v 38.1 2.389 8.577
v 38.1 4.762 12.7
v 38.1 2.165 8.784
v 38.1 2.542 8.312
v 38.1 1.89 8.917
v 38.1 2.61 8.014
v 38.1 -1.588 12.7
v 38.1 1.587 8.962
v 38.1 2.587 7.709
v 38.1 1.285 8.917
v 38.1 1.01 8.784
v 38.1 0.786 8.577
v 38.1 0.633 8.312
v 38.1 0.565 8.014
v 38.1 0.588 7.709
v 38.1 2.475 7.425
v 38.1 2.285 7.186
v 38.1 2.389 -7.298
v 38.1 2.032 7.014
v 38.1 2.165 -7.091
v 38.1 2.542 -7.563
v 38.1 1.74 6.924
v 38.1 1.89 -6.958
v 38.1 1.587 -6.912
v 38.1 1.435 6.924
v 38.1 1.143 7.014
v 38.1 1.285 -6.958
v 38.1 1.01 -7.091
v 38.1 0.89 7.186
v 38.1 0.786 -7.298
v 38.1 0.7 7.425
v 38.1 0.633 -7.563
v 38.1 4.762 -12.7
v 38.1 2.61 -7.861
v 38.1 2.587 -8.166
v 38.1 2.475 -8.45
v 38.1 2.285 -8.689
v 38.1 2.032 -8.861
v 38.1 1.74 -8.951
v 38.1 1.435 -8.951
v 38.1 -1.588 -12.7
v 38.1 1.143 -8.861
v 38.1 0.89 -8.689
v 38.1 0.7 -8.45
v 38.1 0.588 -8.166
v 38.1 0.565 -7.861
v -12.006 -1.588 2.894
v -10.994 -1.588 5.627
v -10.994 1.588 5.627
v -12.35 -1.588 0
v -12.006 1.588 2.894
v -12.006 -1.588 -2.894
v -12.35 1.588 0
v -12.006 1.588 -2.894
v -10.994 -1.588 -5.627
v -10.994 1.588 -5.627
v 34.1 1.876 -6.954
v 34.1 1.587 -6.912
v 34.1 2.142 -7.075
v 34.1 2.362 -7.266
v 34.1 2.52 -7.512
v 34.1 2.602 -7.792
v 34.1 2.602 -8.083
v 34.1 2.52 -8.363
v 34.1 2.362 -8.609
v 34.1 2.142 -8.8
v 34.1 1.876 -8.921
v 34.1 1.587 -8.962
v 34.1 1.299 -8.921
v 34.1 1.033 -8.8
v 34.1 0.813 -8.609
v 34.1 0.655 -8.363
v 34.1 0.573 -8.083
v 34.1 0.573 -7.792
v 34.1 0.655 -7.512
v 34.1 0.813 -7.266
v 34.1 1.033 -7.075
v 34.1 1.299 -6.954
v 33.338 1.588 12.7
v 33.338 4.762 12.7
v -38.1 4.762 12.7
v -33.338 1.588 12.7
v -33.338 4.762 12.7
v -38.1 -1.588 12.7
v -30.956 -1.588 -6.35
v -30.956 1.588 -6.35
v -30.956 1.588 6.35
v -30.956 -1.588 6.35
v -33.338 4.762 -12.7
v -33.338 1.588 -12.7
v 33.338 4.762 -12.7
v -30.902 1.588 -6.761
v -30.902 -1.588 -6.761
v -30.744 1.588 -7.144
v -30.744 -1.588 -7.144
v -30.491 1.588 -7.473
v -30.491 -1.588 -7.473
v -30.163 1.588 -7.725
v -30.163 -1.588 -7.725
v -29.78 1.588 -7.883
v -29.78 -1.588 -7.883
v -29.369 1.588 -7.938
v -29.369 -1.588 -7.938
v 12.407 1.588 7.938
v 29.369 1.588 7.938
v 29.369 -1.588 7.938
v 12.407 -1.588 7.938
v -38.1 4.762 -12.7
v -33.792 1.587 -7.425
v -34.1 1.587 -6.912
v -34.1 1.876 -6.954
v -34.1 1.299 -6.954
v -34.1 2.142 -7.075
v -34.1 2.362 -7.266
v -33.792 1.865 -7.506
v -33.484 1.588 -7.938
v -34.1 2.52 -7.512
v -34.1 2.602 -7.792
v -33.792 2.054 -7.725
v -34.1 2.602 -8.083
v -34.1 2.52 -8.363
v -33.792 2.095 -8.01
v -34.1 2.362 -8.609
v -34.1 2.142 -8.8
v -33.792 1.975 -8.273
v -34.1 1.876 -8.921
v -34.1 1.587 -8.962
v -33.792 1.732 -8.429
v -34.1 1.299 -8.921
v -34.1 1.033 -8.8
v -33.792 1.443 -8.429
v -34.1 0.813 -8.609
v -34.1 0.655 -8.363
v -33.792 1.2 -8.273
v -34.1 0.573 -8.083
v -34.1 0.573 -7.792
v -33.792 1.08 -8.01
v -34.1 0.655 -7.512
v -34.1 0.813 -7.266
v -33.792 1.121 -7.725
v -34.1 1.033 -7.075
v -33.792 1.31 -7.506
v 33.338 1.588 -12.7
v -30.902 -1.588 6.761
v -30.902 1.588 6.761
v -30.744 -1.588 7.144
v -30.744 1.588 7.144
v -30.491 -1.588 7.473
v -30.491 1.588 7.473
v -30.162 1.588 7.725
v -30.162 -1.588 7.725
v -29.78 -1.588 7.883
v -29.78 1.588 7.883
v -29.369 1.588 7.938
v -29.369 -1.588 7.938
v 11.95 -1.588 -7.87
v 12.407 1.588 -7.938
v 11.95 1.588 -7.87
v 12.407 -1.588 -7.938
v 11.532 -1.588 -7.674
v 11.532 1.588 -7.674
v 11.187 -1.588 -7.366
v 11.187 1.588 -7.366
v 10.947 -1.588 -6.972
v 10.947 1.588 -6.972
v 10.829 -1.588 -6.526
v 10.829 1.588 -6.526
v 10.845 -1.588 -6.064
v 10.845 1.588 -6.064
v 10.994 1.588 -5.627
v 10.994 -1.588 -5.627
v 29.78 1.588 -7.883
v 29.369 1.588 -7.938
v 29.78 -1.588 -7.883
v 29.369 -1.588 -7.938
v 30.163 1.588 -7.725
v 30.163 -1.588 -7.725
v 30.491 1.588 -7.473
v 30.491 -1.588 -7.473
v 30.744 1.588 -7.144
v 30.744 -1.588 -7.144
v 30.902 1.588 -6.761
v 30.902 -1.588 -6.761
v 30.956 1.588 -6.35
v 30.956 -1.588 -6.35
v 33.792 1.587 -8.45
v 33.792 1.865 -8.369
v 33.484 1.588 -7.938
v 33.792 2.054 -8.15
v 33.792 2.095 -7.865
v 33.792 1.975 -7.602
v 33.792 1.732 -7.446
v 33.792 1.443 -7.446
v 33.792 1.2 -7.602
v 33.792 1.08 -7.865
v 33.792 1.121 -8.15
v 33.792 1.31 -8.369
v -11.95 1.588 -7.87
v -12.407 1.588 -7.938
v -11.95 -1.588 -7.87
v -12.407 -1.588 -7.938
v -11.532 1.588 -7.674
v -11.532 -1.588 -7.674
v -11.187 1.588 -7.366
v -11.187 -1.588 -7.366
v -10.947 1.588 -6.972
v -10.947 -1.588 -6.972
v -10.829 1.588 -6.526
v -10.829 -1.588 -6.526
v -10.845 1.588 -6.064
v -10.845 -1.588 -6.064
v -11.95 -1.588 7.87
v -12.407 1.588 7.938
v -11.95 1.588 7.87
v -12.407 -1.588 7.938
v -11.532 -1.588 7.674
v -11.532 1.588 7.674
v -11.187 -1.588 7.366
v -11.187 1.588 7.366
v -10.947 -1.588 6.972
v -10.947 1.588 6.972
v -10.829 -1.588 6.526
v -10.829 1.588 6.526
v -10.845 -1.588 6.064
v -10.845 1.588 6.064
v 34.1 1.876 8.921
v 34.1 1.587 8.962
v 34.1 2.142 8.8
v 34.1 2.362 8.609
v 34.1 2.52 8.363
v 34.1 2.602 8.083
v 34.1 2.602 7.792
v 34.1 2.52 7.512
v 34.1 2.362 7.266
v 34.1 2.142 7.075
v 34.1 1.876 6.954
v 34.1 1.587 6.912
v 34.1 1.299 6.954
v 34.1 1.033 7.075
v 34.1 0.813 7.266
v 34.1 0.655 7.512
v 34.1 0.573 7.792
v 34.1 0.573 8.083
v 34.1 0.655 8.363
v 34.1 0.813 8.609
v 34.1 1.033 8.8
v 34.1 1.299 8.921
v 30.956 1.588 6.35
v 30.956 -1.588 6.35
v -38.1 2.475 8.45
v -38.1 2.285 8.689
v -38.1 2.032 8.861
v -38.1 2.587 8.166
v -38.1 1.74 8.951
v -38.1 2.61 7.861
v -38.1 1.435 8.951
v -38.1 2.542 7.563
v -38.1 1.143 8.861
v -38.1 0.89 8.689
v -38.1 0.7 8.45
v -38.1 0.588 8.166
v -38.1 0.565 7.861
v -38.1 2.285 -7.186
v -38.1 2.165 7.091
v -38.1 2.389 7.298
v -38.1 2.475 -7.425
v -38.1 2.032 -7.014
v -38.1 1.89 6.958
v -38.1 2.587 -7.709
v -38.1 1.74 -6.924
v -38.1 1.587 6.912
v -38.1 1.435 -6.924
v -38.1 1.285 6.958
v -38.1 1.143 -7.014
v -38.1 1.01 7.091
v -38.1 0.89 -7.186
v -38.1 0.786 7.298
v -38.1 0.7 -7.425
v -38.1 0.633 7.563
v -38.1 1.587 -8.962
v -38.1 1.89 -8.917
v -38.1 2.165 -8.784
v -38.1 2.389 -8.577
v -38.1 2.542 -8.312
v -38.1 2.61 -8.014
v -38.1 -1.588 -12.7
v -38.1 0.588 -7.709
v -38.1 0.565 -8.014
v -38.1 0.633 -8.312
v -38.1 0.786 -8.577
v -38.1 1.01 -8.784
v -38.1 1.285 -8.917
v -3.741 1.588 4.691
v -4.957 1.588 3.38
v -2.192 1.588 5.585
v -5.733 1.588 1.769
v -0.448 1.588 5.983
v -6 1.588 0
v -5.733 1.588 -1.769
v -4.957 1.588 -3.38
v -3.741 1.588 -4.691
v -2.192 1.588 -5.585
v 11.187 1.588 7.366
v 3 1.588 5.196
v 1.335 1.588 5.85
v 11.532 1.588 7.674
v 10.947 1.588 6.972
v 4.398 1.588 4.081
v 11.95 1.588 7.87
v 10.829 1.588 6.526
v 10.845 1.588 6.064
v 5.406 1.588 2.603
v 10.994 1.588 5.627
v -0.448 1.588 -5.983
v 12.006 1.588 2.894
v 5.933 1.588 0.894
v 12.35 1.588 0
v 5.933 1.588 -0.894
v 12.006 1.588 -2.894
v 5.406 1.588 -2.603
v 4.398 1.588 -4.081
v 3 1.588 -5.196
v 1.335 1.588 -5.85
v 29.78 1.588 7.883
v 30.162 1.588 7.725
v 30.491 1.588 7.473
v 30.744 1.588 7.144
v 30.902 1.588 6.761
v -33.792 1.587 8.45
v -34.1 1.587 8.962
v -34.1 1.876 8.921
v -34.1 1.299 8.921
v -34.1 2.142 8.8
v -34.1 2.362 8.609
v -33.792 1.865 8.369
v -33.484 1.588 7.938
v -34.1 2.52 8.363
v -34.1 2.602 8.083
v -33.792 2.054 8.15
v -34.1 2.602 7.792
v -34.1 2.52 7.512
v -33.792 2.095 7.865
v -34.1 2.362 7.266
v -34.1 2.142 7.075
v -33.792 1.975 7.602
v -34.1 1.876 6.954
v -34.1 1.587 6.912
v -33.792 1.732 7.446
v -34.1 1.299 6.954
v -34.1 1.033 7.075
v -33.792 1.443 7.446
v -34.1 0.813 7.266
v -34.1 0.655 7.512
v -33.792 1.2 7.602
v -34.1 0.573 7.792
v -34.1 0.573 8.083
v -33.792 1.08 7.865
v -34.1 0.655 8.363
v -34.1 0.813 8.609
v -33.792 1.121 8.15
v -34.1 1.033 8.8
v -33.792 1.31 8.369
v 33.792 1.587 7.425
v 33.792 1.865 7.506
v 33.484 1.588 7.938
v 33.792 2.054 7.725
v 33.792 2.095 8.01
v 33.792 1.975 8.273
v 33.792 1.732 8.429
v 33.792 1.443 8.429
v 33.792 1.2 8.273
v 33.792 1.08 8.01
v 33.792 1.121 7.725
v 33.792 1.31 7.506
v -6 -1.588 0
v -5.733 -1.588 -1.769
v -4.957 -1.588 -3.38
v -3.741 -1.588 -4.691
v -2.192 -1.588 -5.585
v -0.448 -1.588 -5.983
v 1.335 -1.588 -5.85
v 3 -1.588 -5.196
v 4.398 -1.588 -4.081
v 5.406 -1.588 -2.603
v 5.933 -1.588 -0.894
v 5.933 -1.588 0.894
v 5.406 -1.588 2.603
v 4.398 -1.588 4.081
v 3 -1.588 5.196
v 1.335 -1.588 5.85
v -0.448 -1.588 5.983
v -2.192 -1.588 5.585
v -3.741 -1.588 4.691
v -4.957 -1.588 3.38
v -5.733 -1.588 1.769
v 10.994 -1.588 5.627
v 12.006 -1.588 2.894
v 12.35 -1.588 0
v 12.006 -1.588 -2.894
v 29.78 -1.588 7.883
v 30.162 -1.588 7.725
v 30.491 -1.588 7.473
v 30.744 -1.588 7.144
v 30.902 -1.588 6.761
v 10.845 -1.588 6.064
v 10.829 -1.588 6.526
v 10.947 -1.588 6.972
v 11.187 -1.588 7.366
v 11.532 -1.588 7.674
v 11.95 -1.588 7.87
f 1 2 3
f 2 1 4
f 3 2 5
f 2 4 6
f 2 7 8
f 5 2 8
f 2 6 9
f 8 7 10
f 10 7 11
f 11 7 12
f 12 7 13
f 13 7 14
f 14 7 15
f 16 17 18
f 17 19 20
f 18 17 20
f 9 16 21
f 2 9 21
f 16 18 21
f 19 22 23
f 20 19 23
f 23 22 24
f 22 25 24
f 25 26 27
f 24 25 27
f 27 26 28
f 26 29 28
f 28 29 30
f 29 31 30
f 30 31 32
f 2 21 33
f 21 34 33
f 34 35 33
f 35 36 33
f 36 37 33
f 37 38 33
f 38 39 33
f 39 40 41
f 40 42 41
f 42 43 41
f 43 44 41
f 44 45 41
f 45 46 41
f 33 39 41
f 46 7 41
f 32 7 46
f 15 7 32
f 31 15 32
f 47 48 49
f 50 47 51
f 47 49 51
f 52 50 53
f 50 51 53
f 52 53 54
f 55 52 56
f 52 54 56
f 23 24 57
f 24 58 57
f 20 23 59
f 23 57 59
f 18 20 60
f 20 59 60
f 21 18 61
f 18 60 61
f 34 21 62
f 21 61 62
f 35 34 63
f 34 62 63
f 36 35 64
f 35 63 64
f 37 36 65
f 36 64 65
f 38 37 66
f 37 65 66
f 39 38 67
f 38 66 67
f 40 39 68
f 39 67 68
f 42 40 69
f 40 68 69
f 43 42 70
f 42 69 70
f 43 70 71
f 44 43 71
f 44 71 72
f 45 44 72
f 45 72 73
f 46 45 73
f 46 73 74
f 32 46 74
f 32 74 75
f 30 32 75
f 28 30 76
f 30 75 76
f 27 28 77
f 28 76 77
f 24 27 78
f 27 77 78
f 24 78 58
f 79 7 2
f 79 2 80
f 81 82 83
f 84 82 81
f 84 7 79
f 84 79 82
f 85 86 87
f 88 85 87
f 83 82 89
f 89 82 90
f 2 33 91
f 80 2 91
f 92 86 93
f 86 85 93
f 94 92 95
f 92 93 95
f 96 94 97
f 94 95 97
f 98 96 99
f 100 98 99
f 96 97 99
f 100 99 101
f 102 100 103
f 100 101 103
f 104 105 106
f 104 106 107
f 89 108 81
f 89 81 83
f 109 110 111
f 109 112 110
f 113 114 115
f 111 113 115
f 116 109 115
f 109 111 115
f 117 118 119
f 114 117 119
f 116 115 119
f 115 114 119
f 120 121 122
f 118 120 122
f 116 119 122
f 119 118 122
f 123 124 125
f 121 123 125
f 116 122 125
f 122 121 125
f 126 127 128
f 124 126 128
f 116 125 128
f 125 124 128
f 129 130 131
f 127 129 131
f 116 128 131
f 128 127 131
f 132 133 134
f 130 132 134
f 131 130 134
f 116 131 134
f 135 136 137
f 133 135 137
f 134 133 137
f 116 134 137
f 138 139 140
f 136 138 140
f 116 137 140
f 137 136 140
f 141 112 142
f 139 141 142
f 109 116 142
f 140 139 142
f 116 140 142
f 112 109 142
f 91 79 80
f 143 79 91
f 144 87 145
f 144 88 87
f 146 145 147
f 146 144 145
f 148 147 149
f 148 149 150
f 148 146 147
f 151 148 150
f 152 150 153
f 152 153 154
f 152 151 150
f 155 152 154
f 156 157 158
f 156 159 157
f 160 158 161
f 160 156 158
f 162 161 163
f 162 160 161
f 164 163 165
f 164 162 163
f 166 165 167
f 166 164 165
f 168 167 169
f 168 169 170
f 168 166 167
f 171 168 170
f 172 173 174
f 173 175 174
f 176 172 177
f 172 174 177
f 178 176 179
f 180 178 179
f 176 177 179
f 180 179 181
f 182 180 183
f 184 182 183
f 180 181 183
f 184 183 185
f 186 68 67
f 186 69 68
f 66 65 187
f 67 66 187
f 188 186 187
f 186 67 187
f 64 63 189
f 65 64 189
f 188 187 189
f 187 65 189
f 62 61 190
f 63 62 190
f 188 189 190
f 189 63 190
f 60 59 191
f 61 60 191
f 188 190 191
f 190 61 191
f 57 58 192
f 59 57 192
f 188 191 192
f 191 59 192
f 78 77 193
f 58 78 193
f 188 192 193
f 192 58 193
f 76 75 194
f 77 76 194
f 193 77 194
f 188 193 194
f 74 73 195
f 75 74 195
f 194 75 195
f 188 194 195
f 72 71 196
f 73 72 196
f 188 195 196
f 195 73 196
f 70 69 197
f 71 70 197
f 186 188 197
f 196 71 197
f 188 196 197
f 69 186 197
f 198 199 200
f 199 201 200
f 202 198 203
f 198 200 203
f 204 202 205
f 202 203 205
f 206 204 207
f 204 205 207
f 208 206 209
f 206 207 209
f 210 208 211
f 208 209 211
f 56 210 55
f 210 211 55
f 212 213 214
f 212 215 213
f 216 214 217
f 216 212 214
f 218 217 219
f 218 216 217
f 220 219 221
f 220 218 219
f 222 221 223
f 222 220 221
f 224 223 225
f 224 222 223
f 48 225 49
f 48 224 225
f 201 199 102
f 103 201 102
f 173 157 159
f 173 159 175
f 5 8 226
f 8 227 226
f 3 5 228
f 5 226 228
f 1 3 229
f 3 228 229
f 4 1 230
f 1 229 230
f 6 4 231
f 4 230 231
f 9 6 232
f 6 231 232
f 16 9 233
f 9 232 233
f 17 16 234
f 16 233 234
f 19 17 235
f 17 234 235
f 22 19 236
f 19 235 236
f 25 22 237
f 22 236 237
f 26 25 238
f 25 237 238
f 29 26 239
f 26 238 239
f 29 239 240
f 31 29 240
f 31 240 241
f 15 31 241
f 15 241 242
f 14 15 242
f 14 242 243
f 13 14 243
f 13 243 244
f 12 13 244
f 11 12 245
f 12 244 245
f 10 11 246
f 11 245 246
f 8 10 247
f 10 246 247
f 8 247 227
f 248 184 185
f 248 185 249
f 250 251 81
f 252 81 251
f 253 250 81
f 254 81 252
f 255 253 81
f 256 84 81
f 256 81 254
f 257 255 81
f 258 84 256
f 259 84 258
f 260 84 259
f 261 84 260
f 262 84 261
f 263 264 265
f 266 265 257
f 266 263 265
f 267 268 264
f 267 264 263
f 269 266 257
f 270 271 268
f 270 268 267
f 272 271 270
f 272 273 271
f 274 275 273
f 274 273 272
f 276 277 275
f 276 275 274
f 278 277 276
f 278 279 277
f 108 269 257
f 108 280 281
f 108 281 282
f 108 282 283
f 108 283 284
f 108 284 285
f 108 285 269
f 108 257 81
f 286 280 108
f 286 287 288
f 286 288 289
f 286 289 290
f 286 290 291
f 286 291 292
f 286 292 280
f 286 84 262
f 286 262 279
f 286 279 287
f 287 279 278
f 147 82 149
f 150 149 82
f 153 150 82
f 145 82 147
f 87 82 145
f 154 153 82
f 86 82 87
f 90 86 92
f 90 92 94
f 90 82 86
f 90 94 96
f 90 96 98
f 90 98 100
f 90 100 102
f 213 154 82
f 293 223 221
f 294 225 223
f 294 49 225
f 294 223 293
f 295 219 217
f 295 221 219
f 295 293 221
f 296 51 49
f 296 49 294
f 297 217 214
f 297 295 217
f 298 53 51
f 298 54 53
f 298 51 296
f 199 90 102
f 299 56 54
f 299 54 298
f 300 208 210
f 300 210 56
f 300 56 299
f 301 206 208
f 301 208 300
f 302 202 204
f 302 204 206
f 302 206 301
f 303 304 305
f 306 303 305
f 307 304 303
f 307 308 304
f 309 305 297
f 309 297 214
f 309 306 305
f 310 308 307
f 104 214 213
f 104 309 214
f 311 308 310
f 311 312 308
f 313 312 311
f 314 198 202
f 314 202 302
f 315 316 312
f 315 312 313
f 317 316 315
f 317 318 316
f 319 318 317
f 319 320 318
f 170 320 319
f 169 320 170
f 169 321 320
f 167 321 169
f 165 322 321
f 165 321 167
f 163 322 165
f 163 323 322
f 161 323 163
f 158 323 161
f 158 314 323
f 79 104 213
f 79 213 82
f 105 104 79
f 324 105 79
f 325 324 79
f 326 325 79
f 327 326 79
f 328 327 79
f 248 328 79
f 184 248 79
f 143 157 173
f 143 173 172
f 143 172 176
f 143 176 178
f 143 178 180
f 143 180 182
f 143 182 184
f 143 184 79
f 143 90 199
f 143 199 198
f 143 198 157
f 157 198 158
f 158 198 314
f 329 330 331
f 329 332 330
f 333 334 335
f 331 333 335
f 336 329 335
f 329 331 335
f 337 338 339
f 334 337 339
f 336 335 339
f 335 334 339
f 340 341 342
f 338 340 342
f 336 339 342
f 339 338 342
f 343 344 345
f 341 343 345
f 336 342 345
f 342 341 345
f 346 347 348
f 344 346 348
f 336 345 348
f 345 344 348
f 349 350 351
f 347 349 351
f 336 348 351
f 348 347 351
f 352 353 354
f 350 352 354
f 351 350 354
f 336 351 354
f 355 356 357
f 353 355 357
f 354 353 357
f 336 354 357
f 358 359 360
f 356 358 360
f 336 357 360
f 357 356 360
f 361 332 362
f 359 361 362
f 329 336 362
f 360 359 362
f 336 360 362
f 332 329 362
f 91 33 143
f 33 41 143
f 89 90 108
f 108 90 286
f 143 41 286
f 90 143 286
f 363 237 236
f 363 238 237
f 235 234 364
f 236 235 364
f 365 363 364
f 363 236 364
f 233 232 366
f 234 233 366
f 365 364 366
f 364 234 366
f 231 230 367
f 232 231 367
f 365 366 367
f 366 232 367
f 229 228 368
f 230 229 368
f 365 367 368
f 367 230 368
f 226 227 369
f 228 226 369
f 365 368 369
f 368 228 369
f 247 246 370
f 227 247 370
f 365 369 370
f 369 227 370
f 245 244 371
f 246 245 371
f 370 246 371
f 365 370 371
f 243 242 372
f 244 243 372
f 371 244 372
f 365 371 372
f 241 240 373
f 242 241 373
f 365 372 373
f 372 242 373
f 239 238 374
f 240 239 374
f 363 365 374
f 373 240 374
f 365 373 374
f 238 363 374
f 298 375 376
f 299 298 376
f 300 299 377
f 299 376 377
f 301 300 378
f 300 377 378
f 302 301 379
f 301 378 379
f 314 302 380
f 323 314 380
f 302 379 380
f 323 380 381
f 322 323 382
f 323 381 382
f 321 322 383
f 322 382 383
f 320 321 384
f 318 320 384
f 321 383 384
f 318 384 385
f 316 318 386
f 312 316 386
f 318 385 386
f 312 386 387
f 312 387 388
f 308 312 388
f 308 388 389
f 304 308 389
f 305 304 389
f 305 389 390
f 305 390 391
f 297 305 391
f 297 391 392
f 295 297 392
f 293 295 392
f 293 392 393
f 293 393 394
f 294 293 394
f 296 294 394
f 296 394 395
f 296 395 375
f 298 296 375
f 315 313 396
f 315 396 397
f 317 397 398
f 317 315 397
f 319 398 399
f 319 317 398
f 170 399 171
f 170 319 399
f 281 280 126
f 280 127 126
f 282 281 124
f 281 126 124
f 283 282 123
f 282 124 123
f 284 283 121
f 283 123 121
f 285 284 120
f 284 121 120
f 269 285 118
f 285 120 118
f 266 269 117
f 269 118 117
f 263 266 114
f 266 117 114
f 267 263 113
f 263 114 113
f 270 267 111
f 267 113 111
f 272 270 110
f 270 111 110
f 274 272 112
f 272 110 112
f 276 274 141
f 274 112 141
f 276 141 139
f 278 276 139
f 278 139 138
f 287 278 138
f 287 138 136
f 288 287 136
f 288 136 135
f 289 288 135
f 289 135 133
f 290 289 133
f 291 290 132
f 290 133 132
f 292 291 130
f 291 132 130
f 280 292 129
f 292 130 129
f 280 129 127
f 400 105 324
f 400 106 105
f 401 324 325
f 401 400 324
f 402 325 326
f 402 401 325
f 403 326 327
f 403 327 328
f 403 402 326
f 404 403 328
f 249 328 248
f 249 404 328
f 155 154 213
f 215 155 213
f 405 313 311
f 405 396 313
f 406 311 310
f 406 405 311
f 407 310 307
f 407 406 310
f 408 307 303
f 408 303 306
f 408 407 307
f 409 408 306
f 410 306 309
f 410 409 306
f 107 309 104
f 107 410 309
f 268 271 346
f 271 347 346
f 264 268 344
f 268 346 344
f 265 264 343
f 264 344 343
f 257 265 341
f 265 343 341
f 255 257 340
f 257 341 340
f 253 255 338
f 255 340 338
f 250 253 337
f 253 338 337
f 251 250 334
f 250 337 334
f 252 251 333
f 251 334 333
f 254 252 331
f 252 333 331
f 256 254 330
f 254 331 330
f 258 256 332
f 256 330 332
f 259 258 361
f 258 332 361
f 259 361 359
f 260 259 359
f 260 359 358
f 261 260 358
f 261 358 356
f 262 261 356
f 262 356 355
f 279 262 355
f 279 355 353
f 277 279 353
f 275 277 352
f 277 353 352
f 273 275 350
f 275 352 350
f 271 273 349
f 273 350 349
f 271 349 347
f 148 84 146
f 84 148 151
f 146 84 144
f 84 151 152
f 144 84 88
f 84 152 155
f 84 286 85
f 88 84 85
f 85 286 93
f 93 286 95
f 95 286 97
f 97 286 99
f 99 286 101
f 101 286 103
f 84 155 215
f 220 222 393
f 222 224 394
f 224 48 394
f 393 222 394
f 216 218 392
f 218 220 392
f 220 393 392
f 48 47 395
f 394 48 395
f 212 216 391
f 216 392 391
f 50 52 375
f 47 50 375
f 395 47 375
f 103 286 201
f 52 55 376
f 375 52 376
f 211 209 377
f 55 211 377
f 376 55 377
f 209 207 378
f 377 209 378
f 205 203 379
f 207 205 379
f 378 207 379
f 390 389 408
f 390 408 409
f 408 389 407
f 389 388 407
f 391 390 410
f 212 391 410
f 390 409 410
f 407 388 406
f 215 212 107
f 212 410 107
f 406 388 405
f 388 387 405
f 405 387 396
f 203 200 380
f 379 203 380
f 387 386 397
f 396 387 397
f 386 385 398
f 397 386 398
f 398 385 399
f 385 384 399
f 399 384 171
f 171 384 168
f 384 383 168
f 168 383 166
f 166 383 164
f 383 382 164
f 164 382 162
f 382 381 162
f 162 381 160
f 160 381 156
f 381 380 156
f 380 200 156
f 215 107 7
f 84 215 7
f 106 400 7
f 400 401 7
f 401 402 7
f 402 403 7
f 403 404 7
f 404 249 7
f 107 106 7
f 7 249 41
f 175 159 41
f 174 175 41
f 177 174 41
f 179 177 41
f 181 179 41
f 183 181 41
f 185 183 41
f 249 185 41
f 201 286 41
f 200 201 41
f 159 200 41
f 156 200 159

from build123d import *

# Parameters (mm, degrees)
SKETCH1_W                    = 76.2
SKETCH1_H                    = 25.4
BOSS_EXTRUDE1_DEPTH          = 1.5875
F_12_0MM_DOWEL_HOLE1_D       = 12
SKETCH5_W                    = 4.7625
SKETCH5_H                    = 25.4
BOSS_EXTRUDE2_DEPTH          = 3.175
M2_5X0_45_TAPPED_HOLE1_D     = 2.05
M2_5X0_45_TAPPED_HOLE1_DEPTH = 3.999992
M2_5X0_45_TAPPED_HOLE1_TIP   = 0.615882135
M2_5X0_45_TAPPED_HOLE2_D     = 2.05
M2_5X0_45_TAPPED_HOLE2_DEPTH = 3.999992
M2_5X0_45_TAPPED_HOLE2_TIP   = 0.615882135
CUT_EXTRUDE1_DEPTH           = 41.286233691
FILLET1_R                    = 1.5875


with BuildPart() as part:
    # Sketch1 → Boss-Extrude1 (new, symmetric)
    with BuildSketch(Plane(origin=(0, 0, 0), x_dir=(1, 0, 0), z_dir=(0, 1, 0))):
        Rectangle(SKETCH1_W, SKETCH1_H)
    extrude(amount=BOSS_EXTRUDE1_DEPTH, both=True)

    # Ø12.0mm Dowel Hole1 (through all)
    with Locations(Plane(origin=(0, 1.5875, 0), x_dir=(1, 0, 0), z_dir=(0, 1, 0))):
        with Locations((0, 0)):
            Hole(F_12_0MM_DOWEL_HOLE1_D / 2)

    # Sketch5 → Boss-Extrude2 (add)
    with BuildSketch(Plane(origin=(0, 1.5875, 0), x_dir=(1, 0, 0), z_dir=(0, 1, 0))):
        with Locations((-35.71875, 0)):
            Rectangle(SKETCH5_W, SKETCH5_H)
    boss_extrude2 = extrude(amount=BOSS_EXTRUDE2_DEPTH)

    # Mirror1: Boss-Extrude2 across plane
    add(boss_extrude2.mirror(Plane(origin=(0, 0, 0), x_dir=(0, 0, 1), z_dir=(1, 0, 0))))

    # M2.5x0.45 Tapped Hole1
    with Locations(Plane.ZY.offset(38.1)):
        with Locations((7.9375, 1.5875), (-7.9375, 1.5875)):
            Hole(M2_5X0_45_TAPPED_HOLE1_D / 2, depth=M2_5X0_45_TAPPED_HOLE1_DEPTH)
            with Locations((0, 0, -(M2_5X0_45_TAPPED_HOLE1_DEPTH + M2_5X0_45_TAPPED_HOLE1_TIP / 2))):  # 118° drill point
                Cone(0, M2_5X0_45_TAPPED_HOLE1_D / 2, M2_5X0_45_TAPPED_HOLE1_TIP, mode=Mode.SUBTRACT)

    # M2.5x0.45 Tapped Hole2
    with Locations(Plane(origin=(38.1, 0, 0), x_dir=(0, 0, -1), z_dir=(1, 0, 0))):
        with Locations((-7.9375, 1.5875), (7.9375, 1.5875)):
            Hole(M2_5X0_45_TAPPED_HOLE2_D / 2, depth=M2_5X0_45_TAPPED_HOLE2_DEPTH)
            with Locations((0, 0, -(M2_5X0_45_TAPPED_HOLE2_DEPTH + M2_5X0_45_TAPPED_HOLE2_TIP / 2))):  # 118° drill point
                Cone(0, M2_5X0_45_TAPPED_HOLE2_D / 2, M2_5X0_45_TAPPED_HOLE2_TIP, mode=Mode.SUBTRACT)

    # Sketch12 → Cut-Extrude1 (cut, through all)
    with BuildSketch(Plane(origin=(0, 1.5875, 0), x_dir=(1, 0, 0), z_dir=(0, 1, 0))):
        with BuildLine():
            Line((-30.95625, 7.9375), (-30.95625, -7.9375))
            Line((-30.95625, -7.9375), (-9.461426623, -7.9375))
            ThreePointArc((-9.461426623, -7.9375), (-12.35, 0), (-9.461426623, 7.9375))
            Line((-9.461426623, 7.9375), (-30.95625, 7.9375))
        make_face()
    cut_extrude1 = extrude(amount=-CUT_EXTRUDE1_DEPTH, mode=Mode.SUBTRACT)

    # Mirror2: Cut-Extrude1 across plane
    add(cut_extrude1.mirror(Plane(origin=(0, 0, 0), x_dir=(0, 0, 1), z_dir=(1, 0, 0))), mode=Mode.SUBTRACT)

    # Fillet1
    fillet1_edges = [part.edges().sort_by_distance(p)[0] for p in [
        (-30.95625, 0, -7.9375),
        (-9.461426623, 0, -7.9375),
        (-9.461426623, 0, 7.9375),
        (-30.95625, 0, 7.9375),
        (9.461426623, 0, -7.9375),
        (30.95625, 0, -7.9375),
        (30.95625, 0, 7.9375),
        (9.461426623, 0, 7.9375),
    ]]
    fillet(fillet1_edges, radius=FILLET1_R)


solid = part.part
